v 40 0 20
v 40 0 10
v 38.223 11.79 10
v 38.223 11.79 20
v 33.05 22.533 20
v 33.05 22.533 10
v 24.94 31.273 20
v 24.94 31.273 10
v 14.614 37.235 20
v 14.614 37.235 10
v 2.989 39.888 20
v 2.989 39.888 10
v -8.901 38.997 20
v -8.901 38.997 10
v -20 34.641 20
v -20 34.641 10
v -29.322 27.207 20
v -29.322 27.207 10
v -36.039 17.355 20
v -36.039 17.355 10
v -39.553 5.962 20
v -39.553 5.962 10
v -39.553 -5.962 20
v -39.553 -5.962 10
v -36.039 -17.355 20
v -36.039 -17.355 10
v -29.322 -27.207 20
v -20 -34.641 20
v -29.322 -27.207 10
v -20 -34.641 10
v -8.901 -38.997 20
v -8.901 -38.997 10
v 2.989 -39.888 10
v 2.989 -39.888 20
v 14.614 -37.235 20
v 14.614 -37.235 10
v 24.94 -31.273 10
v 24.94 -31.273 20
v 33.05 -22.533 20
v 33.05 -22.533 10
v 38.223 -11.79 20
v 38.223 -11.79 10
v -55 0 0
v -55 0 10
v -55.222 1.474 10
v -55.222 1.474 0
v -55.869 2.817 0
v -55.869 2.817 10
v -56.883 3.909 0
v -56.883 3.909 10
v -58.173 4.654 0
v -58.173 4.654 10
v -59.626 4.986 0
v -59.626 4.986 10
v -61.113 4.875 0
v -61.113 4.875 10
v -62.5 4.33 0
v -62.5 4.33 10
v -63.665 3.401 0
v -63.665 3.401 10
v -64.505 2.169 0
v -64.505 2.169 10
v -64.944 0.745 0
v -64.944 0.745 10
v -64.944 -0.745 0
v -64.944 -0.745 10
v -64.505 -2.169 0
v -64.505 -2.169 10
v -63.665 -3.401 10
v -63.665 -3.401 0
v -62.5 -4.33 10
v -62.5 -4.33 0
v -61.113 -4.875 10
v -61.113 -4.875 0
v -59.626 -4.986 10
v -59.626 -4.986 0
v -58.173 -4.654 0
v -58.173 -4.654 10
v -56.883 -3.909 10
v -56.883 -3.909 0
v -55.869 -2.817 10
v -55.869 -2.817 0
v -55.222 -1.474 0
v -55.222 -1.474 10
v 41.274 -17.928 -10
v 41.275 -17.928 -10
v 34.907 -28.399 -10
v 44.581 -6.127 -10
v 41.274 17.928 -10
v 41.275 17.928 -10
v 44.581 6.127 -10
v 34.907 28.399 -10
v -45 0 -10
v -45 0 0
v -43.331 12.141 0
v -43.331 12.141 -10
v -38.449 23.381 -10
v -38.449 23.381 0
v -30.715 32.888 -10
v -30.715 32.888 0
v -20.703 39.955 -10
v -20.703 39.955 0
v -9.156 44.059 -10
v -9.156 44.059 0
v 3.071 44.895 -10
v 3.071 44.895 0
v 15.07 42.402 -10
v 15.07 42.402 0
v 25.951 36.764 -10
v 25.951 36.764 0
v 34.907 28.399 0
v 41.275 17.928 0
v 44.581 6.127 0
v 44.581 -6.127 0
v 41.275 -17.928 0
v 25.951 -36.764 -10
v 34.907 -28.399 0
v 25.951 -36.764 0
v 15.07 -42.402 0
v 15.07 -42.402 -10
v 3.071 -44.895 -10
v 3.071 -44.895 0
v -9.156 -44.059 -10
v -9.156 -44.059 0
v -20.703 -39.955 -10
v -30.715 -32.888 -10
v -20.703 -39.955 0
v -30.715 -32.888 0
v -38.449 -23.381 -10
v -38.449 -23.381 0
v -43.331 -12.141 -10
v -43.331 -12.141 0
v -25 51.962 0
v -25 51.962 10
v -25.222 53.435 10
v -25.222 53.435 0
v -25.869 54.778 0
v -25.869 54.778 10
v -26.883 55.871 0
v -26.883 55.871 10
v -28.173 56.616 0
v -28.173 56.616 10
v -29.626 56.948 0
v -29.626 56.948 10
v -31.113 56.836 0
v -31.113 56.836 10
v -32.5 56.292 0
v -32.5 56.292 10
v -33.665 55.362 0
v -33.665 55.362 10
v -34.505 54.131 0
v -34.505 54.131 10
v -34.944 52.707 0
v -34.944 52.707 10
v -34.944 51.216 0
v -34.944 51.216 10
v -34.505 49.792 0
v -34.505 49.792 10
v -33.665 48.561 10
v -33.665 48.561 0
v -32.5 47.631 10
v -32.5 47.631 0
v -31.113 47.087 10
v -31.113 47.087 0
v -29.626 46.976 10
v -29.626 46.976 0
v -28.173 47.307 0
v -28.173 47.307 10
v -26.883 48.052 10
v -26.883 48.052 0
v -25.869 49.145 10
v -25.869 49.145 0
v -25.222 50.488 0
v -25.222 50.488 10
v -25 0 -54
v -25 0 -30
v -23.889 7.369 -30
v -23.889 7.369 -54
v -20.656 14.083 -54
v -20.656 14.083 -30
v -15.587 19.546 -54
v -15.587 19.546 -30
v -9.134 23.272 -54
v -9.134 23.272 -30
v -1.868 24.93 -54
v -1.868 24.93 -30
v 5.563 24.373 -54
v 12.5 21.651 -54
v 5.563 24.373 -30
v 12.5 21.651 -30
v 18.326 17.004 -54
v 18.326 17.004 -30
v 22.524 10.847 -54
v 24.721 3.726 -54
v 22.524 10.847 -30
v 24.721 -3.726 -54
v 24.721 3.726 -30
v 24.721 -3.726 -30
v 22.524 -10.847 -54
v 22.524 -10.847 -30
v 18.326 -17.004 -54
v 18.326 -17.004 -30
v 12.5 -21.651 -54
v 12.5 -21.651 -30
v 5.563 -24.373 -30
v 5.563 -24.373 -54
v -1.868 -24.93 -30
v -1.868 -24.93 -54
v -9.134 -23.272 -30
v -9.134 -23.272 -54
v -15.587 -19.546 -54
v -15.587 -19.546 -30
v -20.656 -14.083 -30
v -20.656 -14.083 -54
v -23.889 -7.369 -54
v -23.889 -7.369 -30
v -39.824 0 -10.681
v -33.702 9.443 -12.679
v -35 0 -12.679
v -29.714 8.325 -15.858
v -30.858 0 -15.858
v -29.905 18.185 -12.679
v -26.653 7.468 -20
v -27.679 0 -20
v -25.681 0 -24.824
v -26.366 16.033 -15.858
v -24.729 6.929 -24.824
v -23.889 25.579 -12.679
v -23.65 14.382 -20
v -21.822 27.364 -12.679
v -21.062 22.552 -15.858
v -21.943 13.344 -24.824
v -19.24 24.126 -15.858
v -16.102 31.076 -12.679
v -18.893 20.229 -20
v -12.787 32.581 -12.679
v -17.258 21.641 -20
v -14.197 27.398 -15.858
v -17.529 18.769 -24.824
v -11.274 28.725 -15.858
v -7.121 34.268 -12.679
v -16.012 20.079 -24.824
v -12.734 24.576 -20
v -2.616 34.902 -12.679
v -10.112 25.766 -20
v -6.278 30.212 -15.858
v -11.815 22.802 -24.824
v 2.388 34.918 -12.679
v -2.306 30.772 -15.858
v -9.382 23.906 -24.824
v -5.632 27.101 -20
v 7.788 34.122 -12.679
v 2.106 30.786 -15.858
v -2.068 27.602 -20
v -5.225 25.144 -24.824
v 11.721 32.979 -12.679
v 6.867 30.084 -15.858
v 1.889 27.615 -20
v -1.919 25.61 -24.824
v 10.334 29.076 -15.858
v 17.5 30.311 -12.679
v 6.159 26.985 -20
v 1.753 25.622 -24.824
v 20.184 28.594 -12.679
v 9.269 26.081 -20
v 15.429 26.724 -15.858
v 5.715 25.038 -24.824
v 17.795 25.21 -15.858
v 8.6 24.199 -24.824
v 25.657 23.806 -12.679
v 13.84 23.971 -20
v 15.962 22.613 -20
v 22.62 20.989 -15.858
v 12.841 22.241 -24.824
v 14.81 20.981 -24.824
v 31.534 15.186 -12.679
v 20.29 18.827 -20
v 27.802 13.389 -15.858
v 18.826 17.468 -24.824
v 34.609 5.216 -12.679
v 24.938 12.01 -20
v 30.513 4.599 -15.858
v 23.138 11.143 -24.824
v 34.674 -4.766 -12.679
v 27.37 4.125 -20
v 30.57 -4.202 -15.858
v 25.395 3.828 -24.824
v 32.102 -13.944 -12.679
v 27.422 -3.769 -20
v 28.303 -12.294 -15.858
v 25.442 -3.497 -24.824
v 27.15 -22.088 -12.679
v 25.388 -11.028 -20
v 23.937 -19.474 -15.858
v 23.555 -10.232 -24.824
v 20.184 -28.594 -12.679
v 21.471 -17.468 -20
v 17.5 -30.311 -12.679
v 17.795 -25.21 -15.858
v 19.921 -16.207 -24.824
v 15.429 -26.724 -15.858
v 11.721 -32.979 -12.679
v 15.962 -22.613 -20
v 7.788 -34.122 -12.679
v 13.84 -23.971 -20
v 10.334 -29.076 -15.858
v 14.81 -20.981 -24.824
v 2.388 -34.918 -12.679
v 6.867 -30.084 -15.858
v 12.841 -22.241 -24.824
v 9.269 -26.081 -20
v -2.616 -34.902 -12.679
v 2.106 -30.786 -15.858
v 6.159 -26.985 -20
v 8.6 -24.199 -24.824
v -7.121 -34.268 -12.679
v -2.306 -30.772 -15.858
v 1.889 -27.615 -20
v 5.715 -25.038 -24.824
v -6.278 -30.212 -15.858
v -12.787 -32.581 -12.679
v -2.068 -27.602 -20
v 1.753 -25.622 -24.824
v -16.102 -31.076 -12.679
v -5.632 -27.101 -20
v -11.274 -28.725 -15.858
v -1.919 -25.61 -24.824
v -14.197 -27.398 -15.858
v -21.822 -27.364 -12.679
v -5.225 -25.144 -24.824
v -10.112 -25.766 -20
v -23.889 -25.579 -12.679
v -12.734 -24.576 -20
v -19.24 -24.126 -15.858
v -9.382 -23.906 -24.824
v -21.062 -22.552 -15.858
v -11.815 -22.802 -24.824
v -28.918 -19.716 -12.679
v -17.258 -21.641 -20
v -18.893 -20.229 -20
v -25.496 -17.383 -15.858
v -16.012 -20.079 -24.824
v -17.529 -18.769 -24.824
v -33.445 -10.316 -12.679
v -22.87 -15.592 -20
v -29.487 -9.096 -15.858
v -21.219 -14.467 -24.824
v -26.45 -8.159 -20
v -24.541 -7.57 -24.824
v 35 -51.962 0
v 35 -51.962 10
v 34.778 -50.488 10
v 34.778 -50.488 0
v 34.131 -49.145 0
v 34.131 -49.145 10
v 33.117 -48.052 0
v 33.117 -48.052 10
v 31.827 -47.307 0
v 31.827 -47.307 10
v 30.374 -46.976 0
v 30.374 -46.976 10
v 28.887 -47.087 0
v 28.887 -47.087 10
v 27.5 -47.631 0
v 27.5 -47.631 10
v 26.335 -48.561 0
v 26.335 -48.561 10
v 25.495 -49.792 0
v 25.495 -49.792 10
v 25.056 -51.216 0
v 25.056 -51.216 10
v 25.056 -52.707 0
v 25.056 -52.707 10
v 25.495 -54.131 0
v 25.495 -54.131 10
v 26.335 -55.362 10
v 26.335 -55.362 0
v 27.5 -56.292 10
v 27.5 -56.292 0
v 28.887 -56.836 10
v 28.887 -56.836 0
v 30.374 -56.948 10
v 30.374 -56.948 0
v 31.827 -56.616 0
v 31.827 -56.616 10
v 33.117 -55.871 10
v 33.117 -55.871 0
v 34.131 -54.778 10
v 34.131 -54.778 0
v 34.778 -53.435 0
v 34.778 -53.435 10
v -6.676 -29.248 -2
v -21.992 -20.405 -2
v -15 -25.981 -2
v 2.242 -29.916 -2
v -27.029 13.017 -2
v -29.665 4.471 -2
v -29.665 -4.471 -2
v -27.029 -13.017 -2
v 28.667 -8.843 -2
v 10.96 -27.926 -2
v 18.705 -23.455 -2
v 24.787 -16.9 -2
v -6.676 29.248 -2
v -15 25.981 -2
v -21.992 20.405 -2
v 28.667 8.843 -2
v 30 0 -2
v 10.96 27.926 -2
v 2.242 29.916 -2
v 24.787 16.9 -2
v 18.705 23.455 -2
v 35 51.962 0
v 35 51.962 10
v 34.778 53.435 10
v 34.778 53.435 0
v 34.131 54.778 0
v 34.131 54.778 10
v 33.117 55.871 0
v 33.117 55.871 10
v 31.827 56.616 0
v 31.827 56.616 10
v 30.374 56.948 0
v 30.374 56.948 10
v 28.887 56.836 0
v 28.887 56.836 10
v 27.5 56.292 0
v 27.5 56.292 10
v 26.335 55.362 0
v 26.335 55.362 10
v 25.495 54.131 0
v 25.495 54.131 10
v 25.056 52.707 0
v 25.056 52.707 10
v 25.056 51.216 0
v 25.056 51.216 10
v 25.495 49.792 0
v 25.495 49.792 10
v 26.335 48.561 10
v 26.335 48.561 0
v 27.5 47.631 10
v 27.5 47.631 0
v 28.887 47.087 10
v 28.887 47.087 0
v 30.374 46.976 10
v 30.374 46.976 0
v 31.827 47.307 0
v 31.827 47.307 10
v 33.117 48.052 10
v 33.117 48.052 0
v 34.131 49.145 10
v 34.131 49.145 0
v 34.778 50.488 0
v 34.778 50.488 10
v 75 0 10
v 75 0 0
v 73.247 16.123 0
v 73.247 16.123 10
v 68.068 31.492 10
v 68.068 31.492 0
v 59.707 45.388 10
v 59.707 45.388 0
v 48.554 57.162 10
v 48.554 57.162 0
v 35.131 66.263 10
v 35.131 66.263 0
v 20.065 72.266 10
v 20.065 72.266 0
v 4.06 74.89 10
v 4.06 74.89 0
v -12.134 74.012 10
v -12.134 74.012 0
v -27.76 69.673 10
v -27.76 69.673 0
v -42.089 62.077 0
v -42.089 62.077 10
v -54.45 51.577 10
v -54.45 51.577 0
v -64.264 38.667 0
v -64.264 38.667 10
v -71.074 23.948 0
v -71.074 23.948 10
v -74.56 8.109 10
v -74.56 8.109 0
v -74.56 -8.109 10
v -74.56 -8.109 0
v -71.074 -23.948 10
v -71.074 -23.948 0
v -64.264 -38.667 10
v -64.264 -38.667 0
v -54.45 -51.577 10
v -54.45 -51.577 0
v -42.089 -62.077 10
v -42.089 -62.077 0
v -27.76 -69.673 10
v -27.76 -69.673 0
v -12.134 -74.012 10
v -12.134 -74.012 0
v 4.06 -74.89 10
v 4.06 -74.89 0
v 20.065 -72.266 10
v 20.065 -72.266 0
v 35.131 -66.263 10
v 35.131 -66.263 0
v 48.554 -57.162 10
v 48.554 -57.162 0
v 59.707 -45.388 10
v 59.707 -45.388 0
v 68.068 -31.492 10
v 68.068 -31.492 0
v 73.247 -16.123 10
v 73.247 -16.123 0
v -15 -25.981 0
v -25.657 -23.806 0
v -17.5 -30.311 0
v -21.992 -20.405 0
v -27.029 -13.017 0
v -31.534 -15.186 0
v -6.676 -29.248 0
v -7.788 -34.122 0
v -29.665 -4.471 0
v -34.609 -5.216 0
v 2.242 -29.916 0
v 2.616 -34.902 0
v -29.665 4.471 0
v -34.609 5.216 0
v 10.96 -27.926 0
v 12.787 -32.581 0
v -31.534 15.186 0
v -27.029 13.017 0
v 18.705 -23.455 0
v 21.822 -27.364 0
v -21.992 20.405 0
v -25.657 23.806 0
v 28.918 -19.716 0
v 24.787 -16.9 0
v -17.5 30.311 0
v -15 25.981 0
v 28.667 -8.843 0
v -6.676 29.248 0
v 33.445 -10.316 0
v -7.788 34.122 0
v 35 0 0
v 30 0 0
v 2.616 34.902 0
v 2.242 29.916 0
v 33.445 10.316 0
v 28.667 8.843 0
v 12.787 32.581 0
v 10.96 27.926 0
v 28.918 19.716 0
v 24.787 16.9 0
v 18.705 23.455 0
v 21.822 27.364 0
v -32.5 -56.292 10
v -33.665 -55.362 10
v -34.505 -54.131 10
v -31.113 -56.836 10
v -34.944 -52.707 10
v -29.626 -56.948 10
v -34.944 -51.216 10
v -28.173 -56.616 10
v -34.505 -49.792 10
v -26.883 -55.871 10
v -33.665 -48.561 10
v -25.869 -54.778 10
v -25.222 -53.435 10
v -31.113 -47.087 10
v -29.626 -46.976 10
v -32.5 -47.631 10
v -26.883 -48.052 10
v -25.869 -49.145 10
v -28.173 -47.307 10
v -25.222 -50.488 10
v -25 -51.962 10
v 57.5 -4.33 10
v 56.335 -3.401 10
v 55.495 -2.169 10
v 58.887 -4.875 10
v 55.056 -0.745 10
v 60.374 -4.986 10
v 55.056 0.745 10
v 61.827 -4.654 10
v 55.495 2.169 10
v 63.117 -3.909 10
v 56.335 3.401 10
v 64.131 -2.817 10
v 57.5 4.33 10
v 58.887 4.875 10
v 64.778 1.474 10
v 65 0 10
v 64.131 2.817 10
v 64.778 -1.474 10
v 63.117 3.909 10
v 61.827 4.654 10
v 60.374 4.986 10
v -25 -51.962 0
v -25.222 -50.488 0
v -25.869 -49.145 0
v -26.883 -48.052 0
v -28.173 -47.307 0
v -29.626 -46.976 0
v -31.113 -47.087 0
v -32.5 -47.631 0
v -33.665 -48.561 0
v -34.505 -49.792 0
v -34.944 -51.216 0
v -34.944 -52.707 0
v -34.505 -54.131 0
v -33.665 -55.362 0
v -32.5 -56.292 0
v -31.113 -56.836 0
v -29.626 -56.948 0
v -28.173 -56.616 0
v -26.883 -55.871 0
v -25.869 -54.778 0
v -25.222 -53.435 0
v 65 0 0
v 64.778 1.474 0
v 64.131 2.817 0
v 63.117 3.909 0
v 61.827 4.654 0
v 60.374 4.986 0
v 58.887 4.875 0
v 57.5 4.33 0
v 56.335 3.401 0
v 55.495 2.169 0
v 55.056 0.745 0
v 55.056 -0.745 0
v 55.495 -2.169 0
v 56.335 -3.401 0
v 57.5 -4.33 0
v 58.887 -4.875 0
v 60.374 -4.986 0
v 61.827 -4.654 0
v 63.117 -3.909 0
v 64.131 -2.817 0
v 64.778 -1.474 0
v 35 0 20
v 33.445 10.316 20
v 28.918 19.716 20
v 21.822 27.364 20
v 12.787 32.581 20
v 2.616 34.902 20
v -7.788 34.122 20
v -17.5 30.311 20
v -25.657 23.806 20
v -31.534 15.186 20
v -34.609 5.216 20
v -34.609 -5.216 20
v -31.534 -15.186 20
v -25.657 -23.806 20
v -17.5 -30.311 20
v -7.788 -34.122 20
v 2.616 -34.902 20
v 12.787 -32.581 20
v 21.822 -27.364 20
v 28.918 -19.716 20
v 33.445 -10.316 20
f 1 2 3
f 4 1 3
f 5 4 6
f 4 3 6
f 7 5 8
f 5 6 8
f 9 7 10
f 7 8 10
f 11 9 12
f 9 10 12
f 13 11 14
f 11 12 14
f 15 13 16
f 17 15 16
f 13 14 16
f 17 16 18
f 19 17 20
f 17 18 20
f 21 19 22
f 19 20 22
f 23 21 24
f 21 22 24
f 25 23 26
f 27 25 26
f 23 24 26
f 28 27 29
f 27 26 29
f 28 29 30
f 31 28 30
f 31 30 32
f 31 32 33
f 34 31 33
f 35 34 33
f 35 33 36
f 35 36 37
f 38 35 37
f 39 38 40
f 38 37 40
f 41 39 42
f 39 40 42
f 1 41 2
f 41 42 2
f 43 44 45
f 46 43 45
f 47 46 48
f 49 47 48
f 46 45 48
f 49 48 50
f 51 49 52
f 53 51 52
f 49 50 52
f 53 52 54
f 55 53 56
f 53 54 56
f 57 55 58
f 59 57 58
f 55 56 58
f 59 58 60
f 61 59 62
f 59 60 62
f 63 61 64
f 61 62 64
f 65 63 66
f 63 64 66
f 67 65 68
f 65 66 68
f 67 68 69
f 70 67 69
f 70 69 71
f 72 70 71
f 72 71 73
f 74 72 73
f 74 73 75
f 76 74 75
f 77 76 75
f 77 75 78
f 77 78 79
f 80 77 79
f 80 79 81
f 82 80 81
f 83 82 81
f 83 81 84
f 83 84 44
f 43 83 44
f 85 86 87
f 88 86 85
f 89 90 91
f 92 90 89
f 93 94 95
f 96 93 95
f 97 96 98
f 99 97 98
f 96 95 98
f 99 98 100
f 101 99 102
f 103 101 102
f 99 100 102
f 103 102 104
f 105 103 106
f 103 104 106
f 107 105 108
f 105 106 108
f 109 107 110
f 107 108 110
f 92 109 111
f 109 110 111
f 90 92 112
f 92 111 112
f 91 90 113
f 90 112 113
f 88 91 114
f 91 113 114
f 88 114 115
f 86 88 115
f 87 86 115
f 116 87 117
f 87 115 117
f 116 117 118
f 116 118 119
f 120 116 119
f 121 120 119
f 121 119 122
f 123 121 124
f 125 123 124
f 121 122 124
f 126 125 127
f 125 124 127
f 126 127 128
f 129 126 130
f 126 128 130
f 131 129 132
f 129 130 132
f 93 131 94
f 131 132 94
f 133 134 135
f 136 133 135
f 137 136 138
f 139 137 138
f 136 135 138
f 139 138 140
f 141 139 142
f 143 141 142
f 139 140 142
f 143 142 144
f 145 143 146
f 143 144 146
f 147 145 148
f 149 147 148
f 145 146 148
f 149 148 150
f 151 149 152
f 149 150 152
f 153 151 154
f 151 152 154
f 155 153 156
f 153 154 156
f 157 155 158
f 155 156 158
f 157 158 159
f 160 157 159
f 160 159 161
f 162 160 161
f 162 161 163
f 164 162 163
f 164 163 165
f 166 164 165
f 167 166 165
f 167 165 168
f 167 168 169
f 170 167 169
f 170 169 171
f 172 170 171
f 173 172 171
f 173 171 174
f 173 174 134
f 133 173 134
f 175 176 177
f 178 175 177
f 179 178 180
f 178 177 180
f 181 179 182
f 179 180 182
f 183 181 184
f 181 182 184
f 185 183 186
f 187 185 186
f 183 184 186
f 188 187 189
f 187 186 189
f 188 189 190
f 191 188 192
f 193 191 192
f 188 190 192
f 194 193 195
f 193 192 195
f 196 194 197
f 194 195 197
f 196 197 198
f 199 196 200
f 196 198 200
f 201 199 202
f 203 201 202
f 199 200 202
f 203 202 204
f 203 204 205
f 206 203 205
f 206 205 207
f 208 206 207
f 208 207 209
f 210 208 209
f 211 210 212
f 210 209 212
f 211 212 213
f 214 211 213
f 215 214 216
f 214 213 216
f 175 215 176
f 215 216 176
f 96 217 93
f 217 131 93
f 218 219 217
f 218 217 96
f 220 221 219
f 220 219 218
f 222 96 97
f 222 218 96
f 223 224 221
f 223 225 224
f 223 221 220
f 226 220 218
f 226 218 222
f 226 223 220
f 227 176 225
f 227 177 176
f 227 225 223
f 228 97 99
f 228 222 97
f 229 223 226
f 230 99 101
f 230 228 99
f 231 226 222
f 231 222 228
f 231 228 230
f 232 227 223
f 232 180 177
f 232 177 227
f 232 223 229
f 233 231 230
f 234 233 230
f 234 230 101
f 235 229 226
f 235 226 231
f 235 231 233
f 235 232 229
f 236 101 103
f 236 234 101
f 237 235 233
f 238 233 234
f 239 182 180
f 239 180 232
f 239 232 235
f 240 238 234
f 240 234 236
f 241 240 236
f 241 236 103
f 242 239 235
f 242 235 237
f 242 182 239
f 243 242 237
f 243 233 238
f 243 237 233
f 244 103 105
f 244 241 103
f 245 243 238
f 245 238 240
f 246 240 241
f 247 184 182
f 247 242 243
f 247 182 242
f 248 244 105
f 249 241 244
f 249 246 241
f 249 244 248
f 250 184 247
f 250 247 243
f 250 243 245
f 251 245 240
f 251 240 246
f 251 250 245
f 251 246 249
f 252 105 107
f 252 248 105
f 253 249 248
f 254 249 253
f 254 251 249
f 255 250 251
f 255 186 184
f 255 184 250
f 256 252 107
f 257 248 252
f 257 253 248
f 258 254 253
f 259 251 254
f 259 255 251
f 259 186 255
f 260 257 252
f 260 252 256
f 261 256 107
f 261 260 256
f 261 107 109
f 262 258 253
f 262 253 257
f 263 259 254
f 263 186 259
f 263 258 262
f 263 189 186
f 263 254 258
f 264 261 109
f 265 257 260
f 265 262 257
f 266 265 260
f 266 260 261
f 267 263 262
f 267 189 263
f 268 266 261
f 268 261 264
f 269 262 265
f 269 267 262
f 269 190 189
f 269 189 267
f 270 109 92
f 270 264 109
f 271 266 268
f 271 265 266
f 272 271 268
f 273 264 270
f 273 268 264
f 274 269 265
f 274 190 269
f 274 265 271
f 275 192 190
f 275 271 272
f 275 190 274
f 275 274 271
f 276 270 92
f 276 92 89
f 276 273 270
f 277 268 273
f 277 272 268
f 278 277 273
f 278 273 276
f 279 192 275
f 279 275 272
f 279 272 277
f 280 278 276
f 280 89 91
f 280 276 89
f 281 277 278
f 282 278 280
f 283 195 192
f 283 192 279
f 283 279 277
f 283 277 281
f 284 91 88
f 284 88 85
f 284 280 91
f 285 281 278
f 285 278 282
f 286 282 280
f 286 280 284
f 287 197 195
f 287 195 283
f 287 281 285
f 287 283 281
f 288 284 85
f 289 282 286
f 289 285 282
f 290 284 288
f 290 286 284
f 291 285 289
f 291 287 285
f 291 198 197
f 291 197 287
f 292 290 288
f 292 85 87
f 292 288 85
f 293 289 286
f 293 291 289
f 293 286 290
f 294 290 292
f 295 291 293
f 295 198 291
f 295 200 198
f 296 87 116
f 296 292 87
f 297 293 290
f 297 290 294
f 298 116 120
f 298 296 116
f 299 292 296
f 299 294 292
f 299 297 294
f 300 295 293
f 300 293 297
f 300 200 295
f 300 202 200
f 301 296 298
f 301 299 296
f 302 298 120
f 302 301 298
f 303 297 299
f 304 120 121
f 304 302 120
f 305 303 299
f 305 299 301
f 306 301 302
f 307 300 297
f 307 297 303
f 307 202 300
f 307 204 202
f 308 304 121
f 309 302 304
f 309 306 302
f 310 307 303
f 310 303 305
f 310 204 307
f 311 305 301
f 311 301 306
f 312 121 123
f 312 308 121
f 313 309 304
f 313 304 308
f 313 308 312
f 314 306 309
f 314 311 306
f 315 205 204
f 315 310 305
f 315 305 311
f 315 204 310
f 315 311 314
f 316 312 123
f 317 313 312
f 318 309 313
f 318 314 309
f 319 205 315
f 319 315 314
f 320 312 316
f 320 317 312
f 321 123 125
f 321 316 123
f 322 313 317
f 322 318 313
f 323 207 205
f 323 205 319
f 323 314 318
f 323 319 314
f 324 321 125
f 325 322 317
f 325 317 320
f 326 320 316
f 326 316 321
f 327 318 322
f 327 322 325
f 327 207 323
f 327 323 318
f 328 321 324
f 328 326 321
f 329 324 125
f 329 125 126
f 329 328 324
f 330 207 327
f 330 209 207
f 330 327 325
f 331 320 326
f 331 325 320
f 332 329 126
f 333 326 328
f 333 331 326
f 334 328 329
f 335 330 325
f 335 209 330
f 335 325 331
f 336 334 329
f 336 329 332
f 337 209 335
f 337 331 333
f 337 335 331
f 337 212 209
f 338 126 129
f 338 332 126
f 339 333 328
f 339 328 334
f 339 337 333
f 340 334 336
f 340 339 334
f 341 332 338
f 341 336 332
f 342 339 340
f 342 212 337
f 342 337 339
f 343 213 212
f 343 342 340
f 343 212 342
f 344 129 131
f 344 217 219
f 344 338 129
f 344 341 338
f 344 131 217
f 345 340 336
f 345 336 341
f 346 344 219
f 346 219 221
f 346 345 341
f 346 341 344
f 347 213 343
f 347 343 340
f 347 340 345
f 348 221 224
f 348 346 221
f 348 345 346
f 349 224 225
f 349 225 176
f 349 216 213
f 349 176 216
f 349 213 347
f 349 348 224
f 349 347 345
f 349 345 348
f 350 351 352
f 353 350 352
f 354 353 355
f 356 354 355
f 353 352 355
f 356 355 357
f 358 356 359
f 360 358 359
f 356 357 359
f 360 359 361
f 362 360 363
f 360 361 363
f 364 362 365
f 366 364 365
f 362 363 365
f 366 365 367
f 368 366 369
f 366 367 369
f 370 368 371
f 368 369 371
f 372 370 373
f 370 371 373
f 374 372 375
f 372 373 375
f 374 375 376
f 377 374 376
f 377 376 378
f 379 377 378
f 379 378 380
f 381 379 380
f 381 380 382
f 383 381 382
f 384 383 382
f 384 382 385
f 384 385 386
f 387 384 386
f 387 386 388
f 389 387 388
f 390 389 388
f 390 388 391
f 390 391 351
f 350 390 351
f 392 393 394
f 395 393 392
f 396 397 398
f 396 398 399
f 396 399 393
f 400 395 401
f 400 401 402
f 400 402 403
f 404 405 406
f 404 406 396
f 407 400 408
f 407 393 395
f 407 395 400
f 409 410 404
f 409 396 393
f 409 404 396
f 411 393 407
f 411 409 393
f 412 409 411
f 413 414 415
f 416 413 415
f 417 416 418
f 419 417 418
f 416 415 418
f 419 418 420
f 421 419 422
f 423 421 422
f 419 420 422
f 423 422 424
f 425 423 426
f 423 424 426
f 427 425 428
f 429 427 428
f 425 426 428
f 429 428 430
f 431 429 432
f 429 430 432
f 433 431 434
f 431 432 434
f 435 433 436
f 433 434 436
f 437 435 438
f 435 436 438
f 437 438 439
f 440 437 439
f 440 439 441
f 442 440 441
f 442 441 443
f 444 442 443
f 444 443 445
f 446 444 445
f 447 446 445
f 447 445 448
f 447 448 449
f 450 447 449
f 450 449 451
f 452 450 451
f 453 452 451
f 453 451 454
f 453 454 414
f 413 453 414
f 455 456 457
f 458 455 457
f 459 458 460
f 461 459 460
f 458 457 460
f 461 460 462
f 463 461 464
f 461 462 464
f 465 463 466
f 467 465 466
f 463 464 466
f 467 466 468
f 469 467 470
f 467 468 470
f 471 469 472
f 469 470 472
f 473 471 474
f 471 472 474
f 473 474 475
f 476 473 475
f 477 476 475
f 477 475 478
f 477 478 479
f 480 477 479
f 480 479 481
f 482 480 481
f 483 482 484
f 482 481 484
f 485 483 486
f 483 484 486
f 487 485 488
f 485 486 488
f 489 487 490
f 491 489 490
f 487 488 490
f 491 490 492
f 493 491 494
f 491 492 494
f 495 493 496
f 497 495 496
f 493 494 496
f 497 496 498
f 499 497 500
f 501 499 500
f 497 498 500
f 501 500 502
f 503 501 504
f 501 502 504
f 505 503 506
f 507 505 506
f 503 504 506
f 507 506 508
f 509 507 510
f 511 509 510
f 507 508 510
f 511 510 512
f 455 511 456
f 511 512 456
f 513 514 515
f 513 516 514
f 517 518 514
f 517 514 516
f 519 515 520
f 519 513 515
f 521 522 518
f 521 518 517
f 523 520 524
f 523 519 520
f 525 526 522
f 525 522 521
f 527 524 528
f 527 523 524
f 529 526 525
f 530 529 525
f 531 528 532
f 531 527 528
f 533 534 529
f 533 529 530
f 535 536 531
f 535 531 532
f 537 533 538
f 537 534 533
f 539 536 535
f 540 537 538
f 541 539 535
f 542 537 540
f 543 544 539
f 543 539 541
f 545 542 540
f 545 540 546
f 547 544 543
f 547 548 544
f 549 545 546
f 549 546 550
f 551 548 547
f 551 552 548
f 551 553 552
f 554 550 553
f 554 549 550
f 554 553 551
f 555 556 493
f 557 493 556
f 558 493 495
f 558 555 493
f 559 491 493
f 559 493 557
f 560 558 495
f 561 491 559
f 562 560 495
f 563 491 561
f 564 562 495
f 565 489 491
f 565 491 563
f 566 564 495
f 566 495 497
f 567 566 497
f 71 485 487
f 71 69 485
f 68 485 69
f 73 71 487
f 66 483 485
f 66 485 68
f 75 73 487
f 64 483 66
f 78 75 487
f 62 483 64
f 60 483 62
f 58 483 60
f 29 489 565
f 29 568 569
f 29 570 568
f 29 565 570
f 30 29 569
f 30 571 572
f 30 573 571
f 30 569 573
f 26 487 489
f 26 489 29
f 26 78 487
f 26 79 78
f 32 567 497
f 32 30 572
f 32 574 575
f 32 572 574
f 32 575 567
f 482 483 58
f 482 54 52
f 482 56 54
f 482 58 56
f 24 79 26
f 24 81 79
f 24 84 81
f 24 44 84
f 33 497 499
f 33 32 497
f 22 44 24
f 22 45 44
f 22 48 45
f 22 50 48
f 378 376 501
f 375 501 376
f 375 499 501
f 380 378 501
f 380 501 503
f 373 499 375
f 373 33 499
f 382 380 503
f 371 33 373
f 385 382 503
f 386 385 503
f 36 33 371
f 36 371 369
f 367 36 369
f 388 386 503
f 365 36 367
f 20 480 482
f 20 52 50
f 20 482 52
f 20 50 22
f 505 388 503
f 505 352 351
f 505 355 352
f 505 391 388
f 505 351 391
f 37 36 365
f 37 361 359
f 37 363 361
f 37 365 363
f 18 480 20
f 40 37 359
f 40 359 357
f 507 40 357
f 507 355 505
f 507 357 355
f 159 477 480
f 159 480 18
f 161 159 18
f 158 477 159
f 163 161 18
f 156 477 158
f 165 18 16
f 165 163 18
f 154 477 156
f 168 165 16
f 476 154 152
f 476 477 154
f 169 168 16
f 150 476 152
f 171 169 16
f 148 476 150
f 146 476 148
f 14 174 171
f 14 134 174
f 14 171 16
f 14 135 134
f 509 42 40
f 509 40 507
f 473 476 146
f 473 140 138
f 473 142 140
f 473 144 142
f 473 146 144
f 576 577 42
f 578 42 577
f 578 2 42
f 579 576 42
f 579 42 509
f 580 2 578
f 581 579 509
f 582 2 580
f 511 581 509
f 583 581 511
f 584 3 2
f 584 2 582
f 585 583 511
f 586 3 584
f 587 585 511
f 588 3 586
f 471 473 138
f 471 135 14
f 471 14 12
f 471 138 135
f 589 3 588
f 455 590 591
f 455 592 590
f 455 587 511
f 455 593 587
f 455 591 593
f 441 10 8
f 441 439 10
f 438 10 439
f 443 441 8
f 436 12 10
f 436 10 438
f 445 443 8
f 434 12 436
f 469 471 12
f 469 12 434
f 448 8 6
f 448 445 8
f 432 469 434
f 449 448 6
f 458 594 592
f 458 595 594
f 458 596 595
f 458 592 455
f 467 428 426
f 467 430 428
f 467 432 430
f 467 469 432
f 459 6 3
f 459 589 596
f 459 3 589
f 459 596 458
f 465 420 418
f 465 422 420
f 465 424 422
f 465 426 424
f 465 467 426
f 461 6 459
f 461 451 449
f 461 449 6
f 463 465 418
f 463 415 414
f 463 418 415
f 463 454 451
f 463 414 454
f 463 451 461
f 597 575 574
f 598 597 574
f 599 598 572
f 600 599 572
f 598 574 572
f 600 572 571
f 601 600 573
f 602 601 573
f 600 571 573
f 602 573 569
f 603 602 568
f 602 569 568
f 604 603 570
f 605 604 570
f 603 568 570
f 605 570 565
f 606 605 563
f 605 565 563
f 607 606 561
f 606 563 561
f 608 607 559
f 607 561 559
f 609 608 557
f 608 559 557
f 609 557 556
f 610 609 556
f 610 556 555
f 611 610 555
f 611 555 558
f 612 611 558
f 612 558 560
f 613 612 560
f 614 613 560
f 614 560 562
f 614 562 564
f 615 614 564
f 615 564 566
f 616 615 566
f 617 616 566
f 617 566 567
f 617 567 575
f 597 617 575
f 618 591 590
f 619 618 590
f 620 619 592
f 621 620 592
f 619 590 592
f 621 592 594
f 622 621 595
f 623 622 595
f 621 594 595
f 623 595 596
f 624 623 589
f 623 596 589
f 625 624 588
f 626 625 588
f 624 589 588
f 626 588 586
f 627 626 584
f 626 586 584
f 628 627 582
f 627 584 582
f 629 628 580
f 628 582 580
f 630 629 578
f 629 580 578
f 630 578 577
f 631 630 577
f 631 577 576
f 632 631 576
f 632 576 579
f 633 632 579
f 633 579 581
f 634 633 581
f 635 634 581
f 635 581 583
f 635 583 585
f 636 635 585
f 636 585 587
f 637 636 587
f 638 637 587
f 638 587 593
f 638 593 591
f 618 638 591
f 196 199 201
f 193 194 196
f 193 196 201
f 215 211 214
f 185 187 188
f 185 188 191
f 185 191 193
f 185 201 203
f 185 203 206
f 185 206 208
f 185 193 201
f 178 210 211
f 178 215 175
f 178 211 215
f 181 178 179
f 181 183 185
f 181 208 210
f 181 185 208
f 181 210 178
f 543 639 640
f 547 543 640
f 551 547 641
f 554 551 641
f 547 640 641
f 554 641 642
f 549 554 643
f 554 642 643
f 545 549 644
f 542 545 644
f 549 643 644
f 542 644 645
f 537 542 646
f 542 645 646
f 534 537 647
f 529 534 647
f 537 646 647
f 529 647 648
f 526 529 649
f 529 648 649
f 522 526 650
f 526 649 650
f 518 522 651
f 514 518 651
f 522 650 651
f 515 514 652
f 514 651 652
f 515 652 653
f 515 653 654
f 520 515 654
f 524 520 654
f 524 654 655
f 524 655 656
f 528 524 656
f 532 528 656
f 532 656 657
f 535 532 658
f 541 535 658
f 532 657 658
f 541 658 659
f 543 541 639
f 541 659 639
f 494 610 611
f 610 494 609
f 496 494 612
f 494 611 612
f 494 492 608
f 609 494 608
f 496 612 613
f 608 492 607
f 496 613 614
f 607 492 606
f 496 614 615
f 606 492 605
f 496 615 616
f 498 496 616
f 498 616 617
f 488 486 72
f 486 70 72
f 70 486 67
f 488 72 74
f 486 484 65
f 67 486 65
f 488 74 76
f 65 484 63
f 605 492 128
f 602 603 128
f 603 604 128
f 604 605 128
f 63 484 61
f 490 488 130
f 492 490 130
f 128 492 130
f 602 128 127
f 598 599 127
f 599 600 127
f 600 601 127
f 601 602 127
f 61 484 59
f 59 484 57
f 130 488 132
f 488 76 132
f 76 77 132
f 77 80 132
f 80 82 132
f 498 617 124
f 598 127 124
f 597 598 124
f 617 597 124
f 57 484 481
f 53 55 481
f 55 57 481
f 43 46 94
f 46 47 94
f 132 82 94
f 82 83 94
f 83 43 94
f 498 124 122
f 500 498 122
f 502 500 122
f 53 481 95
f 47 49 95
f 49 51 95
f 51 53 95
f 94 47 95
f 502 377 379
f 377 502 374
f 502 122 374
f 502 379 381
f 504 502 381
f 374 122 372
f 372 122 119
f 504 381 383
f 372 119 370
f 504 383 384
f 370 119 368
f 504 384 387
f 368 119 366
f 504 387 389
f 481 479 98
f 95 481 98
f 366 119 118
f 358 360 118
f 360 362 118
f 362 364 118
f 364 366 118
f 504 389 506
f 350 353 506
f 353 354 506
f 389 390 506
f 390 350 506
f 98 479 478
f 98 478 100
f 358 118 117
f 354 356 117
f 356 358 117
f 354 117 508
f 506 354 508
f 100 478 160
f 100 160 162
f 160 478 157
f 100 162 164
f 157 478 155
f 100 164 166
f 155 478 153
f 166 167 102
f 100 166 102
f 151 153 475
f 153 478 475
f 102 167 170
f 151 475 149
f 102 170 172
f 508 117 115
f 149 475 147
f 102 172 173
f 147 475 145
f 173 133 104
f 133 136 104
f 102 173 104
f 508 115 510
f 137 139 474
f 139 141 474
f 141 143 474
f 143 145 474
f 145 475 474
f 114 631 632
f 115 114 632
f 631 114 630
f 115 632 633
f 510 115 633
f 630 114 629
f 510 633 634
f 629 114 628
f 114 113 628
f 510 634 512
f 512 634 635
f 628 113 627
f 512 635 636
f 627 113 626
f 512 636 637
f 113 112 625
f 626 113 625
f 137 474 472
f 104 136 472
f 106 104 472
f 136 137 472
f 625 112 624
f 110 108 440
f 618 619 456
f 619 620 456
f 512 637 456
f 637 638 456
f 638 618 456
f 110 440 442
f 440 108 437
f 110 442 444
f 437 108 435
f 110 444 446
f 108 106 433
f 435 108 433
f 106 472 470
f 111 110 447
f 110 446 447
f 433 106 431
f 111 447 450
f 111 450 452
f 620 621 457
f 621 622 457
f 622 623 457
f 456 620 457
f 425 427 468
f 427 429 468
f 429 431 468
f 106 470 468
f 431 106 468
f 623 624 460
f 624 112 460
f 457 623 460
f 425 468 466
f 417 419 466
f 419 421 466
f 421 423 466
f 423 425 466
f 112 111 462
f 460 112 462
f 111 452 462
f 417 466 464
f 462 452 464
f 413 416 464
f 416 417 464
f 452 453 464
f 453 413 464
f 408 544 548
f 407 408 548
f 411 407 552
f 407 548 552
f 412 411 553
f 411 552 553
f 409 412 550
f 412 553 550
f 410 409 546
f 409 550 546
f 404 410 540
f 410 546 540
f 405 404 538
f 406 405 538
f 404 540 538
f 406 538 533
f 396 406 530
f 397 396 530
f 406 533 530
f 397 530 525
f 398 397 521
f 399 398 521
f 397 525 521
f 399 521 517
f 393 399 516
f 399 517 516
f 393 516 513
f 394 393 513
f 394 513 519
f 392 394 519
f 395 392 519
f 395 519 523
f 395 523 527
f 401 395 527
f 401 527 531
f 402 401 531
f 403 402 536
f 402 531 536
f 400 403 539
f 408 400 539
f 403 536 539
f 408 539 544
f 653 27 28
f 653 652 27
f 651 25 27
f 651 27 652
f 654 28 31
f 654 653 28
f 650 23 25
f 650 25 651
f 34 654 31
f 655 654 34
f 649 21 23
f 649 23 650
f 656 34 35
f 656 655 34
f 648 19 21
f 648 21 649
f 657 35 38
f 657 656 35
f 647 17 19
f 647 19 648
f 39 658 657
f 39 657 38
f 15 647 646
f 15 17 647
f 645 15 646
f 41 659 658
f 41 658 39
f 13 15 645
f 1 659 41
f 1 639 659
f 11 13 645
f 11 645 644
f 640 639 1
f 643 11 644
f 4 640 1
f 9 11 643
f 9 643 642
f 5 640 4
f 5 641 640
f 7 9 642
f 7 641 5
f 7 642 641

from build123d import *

# Parameters (mm, degrees)
SKETCH1_R           = 75
BOSS_EXTRUDE1_DEPTH = 10
SKETCH2_R           = 45
BOSS_EXTRUDE2_DEPTH = 10
SKETCH3_R           = 25
BOSS_EXTRUDE3_DEPTH = 44
FILLET1_R           = 20
SKETCH4_R           = 40
BOSS_EXTRUDE4_DEPTH = 10
SKETCH5_R           = 35
CUT_EXTRUDE1_DEPTH  = 20
SKETCH6_R           = 30
CUT_EXTRUDE2_DEPTH  = 2
SKETCH7_R           = 5
CUT_EXTRUDE3_DEPTH  = 124.878973196


with BuildPart() as part:
    # Sketch1 → Boss-Extrude1 (new body)
    with BuildSketch(Plane.XY):
        Circle(SKETCH1_R)
    extrude(amount=BOSS_EXTRUDE1_DEPTH)

    # Sketch2 → Boss-Extrude2 (add)
    with BuildSketch(Plane(origin=(0, 0, 0), x_dir=(-1, 0, 0), z_dir=(0, 0, -1))):
        Circle(SKETCH2_R)
    extrude(amount=BOSS_EXTRUDE2_DEPTH)

    # Sketch3 → Boss-Extrude3 (add)
    with BuildSketch(Plane(origin=(0, 0, -10), x_dir=(-1, 0, 0), z_dir=(0, 0, -1))):
        Circle(SKETCH3_R)
    extrude(amount=BOSS_EXTRUDE3_DEPTH)

    # Fillet1
    fillet1_edges = [part.edges().sort_by_distance(p)[0] for p in [
        (25, 0, -10),
    ]]
    fillet(fillet1_edges, radius=FILLET1_R - 0.0001)  # a hair under: the kernel refuses the full size

    # Sketch4 → Boss-Extrude4 (add)
    with BuildSketch(Plane.XY.offset(10)):
        Circle(SKETCH4_R)
    extrude(amount=BOSS_EXTRUDE4_DEPTH)

    # Sketch5 → Cut-Extrude1 (cut)
    with BuildSketch(Plane.XY.offset(20)):
        Circle(SKETCH5_R)
    extrude(amount=-CUT_EXTRUDE1_DEPTH, mode=Mode.SUBTRACT)

    # Sketch6 → Cut-Extrude2 (cut)
    with BuildSketch(Plane.XY):
        Circle(SKETCH6_R)
    extrude(amount=-CUT_EXTRUDE2_DEPTH, mode=Mode.SUBTRACT)

    # Sketch7 → Cut-Extrude3 (cut, through all)
    with BuildSketch(Plane.XY.offset(10)):
        with Locations((60, 0)):
            Circle(SKETCH7_R)
        with Locations((30, -51.961524227)):
            Circle(SKETCH7_R)
        with Locations((-30, -51.961524227)):
            Circle(SKETCH7_R)
        with Locations((-60, 0)):
            Circle(SKETCH7_R)
        with Locations((-30, 51.961524227)):
            Circle(SKETCH7_R)
        with Locations((30, 51.961524227)):
            Circle(SKETCH7_R)
    extrude(amount=-CUT_EXTRUDE3_DEPTH, mode=Mode.SUBTRACT)


solid = part.part
